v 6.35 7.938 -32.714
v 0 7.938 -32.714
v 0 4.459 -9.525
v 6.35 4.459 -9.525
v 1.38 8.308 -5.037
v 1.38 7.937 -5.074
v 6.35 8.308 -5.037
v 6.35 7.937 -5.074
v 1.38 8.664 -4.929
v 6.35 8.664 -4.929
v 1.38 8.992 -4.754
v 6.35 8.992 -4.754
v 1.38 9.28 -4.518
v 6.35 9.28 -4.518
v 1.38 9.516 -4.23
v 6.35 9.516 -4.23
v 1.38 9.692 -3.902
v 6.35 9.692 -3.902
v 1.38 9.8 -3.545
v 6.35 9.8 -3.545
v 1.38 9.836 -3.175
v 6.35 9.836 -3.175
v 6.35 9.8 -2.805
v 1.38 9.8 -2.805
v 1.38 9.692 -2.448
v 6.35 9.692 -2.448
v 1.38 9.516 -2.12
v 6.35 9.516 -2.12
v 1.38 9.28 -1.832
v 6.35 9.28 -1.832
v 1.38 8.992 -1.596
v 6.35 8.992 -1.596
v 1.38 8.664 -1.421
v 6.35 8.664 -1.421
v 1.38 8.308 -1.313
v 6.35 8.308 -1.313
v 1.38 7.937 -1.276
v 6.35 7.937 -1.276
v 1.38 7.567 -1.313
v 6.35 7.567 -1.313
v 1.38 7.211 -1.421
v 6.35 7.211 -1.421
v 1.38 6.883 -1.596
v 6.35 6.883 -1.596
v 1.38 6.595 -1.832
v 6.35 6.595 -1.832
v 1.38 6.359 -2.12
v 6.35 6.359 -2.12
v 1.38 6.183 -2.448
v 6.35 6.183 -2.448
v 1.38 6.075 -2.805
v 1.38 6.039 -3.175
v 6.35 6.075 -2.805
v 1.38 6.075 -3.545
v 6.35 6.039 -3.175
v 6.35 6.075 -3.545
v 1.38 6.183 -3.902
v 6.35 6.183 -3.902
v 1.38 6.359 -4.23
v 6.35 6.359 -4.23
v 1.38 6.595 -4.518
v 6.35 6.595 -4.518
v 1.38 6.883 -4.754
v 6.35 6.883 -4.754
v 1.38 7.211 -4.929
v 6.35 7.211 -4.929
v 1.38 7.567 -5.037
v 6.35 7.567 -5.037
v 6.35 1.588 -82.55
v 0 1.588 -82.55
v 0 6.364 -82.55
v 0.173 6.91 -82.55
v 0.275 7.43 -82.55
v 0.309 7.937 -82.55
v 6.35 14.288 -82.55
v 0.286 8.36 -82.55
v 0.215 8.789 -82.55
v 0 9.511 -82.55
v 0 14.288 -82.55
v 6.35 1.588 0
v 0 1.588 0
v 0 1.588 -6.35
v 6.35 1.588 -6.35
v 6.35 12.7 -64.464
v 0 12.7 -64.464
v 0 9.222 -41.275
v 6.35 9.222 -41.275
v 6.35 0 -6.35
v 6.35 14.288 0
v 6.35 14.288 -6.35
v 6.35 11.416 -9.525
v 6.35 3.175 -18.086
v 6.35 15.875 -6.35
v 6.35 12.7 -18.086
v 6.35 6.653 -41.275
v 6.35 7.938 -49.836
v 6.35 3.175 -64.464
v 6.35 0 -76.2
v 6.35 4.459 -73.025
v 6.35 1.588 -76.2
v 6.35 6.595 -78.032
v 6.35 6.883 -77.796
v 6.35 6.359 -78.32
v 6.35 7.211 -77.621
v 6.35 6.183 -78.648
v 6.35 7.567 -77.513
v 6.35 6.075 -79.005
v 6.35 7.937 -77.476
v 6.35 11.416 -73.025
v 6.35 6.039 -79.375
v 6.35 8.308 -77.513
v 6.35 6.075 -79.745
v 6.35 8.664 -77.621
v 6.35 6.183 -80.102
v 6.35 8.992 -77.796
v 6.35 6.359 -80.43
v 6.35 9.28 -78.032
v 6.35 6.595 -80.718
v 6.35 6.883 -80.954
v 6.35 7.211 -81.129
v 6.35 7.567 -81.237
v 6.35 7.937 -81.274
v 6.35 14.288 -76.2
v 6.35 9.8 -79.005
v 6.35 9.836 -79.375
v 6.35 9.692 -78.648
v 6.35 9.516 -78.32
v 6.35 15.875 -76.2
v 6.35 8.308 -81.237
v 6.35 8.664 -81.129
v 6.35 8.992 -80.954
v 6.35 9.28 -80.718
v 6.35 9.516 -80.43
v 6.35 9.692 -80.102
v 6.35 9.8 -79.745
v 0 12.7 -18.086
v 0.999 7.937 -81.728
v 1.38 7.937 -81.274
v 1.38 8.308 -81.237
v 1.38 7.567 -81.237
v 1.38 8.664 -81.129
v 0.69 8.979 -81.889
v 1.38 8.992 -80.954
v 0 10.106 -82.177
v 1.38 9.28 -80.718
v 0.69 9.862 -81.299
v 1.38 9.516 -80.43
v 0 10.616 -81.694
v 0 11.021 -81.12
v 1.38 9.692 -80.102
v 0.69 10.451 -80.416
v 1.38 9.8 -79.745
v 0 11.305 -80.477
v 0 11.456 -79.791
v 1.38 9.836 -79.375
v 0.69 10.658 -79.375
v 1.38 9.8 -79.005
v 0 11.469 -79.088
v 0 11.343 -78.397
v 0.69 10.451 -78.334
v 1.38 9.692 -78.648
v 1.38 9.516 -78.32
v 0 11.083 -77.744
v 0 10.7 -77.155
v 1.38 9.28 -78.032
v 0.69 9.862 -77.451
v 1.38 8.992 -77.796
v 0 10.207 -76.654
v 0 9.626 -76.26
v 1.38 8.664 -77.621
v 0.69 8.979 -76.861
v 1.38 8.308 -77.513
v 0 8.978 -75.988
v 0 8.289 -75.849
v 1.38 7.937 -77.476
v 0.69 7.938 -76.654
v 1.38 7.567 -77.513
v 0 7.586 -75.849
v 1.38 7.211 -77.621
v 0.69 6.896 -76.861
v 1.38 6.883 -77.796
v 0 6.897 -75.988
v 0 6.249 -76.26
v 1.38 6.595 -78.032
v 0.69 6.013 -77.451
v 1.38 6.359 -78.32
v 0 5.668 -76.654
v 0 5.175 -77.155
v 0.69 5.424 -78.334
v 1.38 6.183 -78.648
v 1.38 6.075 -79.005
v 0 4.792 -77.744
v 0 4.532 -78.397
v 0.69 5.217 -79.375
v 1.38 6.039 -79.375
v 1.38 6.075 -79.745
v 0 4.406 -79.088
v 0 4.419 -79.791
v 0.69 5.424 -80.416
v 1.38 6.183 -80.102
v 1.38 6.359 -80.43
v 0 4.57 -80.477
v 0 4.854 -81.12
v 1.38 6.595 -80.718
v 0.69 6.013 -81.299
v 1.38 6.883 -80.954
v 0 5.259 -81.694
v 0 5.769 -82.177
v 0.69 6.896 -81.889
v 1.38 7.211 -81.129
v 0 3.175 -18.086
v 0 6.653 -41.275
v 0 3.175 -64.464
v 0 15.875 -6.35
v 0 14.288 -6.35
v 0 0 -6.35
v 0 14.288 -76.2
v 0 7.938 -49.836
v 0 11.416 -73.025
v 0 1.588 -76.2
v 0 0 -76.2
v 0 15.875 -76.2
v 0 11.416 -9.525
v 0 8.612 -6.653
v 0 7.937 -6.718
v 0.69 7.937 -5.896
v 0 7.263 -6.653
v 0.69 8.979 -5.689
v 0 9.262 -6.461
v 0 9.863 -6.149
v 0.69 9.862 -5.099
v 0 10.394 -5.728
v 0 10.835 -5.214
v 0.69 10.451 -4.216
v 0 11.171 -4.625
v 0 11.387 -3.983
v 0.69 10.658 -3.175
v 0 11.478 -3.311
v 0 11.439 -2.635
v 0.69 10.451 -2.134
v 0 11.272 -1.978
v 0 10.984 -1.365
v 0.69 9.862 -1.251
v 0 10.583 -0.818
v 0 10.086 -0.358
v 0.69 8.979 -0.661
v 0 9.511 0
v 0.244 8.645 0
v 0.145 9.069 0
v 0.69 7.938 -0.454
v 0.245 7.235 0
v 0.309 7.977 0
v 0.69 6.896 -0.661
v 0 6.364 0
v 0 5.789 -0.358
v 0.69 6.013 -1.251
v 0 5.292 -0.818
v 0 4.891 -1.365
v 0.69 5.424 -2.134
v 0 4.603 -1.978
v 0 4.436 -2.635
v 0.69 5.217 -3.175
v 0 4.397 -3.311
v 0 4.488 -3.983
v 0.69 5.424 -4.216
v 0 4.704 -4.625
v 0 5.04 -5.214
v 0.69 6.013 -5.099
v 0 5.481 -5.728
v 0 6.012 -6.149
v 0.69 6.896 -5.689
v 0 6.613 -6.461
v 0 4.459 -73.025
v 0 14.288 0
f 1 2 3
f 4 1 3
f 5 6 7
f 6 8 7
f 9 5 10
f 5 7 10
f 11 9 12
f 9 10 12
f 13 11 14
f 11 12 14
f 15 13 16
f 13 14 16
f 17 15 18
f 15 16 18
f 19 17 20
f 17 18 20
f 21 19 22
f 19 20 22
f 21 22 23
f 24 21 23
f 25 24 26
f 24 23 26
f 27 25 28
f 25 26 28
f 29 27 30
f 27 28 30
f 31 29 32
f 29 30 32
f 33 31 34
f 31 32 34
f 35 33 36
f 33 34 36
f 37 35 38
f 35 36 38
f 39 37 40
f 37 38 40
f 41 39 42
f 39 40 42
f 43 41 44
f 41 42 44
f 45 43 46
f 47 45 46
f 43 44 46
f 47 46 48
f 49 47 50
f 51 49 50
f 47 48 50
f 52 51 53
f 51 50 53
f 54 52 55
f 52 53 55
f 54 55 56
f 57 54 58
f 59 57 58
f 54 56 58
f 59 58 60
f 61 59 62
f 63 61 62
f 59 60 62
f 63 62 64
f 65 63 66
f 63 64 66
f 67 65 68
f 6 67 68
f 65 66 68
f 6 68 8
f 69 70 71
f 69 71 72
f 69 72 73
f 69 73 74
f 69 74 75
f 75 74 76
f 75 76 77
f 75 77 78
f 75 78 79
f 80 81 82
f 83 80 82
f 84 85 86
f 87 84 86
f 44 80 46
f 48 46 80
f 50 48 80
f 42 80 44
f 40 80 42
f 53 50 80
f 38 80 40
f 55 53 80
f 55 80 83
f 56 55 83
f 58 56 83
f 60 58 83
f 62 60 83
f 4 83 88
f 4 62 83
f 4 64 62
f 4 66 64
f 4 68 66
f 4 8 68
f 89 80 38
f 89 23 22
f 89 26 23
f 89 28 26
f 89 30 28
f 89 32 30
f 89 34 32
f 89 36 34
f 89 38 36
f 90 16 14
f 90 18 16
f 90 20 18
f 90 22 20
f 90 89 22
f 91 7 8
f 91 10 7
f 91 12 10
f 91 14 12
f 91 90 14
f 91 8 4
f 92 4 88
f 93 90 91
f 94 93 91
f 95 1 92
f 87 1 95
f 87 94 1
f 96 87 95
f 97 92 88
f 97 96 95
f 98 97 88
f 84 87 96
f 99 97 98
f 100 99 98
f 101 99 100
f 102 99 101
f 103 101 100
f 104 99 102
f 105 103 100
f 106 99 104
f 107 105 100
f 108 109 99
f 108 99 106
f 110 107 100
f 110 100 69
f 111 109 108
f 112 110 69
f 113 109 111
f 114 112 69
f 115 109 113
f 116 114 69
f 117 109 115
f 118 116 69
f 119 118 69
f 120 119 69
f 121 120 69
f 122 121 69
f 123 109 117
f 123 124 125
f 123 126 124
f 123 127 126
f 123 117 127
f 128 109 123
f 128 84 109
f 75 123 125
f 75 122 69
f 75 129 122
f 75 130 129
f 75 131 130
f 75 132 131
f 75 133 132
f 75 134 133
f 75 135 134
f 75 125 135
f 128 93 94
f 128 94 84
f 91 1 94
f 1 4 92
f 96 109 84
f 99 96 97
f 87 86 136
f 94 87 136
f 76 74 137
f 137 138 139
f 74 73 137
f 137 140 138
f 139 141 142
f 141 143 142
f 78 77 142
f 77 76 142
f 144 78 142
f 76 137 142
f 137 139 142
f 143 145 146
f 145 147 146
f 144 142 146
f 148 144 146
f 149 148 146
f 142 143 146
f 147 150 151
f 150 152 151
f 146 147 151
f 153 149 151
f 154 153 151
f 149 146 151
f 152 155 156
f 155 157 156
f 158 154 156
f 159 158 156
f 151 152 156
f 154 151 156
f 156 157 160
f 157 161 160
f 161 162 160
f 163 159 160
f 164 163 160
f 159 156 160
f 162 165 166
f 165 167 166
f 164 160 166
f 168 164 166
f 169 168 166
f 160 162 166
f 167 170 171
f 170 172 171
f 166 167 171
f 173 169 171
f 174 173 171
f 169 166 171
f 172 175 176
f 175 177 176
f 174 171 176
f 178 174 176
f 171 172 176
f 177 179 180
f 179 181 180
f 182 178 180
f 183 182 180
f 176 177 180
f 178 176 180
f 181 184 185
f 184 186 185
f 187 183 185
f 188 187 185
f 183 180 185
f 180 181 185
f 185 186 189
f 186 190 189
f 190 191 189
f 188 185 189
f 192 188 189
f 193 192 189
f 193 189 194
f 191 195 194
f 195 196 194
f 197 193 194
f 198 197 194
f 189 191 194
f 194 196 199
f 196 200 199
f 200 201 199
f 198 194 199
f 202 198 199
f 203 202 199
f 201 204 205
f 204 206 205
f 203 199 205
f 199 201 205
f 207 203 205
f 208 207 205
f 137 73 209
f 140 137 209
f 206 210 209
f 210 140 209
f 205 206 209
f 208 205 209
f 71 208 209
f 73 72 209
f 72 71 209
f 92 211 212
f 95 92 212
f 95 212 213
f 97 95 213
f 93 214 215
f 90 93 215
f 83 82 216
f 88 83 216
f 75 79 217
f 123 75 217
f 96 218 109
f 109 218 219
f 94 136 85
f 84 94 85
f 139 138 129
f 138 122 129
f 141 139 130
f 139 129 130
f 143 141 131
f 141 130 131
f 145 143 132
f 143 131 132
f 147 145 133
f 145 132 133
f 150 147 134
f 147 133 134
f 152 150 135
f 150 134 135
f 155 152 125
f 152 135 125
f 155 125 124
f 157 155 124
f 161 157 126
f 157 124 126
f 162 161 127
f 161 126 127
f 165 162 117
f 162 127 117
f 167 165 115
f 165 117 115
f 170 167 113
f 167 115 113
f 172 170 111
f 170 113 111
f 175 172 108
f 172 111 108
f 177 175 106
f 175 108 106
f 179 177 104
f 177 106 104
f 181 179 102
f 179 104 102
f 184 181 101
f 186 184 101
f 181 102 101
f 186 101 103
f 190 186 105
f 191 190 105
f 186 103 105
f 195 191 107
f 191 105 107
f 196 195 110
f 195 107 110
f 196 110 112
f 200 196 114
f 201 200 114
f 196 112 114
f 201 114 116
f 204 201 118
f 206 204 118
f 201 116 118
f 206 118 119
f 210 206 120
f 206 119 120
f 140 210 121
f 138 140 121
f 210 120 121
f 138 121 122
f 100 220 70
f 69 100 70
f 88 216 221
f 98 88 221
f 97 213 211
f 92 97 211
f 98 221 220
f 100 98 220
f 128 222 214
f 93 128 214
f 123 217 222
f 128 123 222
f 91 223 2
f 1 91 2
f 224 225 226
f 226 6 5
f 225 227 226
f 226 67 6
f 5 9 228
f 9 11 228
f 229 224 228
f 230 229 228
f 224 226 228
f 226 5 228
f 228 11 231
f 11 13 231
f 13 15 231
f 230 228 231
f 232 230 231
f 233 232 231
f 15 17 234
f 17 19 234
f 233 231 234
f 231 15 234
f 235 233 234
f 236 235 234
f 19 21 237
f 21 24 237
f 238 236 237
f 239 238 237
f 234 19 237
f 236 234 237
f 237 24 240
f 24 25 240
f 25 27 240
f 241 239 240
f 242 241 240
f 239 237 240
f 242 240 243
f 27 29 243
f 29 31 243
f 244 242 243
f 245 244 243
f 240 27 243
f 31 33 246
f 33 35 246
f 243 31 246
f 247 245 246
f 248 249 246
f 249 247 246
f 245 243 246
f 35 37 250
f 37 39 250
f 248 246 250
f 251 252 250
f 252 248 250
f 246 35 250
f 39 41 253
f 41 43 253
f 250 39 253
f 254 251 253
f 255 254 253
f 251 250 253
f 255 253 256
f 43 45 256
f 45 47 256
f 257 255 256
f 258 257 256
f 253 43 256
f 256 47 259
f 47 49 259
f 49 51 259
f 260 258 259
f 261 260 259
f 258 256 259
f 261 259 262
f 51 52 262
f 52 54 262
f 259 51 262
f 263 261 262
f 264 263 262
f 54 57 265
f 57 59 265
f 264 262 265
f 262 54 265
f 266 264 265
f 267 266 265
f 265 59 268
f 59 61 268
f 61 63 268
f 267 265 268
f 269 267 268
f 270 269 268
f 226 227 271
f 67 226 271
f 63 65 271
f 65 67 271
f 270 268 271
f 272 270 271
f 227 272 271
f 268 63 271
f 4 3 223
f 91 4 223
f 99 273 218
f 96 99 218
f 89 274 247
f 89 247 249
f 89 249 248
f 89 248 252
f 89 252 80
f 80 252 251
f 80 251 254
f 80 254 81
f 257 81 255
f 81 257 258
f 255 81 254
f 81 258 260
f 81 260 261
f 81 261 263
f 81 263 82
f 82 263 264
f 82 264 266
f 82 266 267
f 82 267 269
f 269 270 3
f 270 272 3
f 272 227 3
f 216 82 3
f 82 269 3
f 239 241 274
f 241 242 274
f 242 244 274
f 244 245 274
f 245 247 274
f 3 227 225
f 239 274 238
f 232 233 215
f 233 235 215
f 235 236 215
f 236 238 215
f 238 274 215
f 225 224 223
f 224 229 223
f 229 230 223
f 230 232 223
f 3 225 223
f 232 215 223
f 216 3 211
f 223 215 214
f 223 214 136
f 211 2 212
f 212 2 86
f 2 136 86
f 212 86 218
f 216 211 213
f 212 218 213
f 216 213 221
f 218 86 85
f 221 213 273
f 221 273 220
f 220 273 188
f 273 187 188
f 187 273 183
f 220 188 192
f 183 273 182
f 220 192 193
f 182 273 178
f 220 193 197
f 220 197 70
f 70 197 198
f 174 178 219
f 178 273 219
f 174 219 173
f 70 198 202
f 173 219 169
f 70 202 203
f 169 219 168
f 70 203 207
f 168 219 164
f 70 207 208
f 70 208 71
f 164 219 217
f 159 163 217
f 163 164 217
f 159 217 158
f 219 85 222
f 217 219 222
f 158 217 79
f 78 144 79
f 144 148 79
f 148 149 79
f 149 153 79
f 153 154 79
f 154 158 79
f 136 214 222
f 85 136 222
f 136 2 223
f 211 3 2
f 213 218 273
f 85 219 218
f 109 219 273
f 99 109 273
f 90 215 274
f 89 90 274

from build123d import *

# Parameters (mm, degrees)
BOSS_EXTRUDE1_DEPTH                               = 6.35
CSK_FOR_6_FLAT_HEAD_MACHINE_SCREW_100_D           = 3.7973
CSK_FOR_6_FLAT_HEAD_MACHINE_SCREW_100_CSINK_D     = 7.0866
CSK_FOR_6_FLAT_HEAD_MACHINE_SCREW_100_CSINK_ANGLE = 100
CUT_EXTRUDE1_DEPTH                                = 85.302079601


with BuildPart() as part:
    # Sketch1 → Boss-Extrude1 (new body)
    with BuildSketch(Plane(origin=(0, 0, 0), x_dir=(0, 0, -1), z_dir=(1, 0, 0))):
        Polygon((76.2, 15.875), (41.275, 15.875), (41.275, 0), (76.2, 0), (76.2, 1.5875), (82.55, 1.5875), (82.55, 14.2875), (76.2, 14.2875), align=None)
        Polygon((41.275, 0), (41.275, 15.875), (6.35, 15.875), (6.35, 14.2875), (0, 14.2875), (0, 1.5875), (6.35, 1.5875), (6.35, 0), align=None)
    extrude(amount=BOSS_EXTRUDE1_DEPTH)

    # CSK for #6 Flat Head Machine Screw (100)1 (through all)
    with Locations(Plane.ZY):
        with Locations((-79.375, 7.9375), (-3.175, 7.9375)):
            CounterSinkHole(CSK_FOR_6_FLAT_HEAD_MACHINE_SCREW_100_D / 2, CSK_FOR_6_FLAT_HEAD_MACHINE_SCREW_100_CSINK_D / 2, counter_sink_angle=CSK_FOR_6_FLAT_HEAD_MACHINE_SCREW_100_CSINK_ANGLE)

    # Sketch4 → Cut-Extrude1 (cut, through all)
    with BuildSketch(Plane.ZY):
        Polygon((-49.83638683, 7.9375), (-73.025, 11.415791976), (-73.025, 4.459208024), align=None)
        Polygon((-18.08638683, 12.7), (-64.46361317, 12.7), (-41.275, 9.221708024), align=None)
        Polygon((-9.525, 11.415791976), (-32.71361317, 7.9375), (-9.525, 4.459208024), align=None)
        Polygon((-18.08638683, 3.175), (-41.275, 6.653291976), (-64.46361317, 3.175), align=None)
    extrude(amount=-CUT_EXTRUDE1_DEPTH, mode=Mode.SUBTRACT)


solid = part.part
